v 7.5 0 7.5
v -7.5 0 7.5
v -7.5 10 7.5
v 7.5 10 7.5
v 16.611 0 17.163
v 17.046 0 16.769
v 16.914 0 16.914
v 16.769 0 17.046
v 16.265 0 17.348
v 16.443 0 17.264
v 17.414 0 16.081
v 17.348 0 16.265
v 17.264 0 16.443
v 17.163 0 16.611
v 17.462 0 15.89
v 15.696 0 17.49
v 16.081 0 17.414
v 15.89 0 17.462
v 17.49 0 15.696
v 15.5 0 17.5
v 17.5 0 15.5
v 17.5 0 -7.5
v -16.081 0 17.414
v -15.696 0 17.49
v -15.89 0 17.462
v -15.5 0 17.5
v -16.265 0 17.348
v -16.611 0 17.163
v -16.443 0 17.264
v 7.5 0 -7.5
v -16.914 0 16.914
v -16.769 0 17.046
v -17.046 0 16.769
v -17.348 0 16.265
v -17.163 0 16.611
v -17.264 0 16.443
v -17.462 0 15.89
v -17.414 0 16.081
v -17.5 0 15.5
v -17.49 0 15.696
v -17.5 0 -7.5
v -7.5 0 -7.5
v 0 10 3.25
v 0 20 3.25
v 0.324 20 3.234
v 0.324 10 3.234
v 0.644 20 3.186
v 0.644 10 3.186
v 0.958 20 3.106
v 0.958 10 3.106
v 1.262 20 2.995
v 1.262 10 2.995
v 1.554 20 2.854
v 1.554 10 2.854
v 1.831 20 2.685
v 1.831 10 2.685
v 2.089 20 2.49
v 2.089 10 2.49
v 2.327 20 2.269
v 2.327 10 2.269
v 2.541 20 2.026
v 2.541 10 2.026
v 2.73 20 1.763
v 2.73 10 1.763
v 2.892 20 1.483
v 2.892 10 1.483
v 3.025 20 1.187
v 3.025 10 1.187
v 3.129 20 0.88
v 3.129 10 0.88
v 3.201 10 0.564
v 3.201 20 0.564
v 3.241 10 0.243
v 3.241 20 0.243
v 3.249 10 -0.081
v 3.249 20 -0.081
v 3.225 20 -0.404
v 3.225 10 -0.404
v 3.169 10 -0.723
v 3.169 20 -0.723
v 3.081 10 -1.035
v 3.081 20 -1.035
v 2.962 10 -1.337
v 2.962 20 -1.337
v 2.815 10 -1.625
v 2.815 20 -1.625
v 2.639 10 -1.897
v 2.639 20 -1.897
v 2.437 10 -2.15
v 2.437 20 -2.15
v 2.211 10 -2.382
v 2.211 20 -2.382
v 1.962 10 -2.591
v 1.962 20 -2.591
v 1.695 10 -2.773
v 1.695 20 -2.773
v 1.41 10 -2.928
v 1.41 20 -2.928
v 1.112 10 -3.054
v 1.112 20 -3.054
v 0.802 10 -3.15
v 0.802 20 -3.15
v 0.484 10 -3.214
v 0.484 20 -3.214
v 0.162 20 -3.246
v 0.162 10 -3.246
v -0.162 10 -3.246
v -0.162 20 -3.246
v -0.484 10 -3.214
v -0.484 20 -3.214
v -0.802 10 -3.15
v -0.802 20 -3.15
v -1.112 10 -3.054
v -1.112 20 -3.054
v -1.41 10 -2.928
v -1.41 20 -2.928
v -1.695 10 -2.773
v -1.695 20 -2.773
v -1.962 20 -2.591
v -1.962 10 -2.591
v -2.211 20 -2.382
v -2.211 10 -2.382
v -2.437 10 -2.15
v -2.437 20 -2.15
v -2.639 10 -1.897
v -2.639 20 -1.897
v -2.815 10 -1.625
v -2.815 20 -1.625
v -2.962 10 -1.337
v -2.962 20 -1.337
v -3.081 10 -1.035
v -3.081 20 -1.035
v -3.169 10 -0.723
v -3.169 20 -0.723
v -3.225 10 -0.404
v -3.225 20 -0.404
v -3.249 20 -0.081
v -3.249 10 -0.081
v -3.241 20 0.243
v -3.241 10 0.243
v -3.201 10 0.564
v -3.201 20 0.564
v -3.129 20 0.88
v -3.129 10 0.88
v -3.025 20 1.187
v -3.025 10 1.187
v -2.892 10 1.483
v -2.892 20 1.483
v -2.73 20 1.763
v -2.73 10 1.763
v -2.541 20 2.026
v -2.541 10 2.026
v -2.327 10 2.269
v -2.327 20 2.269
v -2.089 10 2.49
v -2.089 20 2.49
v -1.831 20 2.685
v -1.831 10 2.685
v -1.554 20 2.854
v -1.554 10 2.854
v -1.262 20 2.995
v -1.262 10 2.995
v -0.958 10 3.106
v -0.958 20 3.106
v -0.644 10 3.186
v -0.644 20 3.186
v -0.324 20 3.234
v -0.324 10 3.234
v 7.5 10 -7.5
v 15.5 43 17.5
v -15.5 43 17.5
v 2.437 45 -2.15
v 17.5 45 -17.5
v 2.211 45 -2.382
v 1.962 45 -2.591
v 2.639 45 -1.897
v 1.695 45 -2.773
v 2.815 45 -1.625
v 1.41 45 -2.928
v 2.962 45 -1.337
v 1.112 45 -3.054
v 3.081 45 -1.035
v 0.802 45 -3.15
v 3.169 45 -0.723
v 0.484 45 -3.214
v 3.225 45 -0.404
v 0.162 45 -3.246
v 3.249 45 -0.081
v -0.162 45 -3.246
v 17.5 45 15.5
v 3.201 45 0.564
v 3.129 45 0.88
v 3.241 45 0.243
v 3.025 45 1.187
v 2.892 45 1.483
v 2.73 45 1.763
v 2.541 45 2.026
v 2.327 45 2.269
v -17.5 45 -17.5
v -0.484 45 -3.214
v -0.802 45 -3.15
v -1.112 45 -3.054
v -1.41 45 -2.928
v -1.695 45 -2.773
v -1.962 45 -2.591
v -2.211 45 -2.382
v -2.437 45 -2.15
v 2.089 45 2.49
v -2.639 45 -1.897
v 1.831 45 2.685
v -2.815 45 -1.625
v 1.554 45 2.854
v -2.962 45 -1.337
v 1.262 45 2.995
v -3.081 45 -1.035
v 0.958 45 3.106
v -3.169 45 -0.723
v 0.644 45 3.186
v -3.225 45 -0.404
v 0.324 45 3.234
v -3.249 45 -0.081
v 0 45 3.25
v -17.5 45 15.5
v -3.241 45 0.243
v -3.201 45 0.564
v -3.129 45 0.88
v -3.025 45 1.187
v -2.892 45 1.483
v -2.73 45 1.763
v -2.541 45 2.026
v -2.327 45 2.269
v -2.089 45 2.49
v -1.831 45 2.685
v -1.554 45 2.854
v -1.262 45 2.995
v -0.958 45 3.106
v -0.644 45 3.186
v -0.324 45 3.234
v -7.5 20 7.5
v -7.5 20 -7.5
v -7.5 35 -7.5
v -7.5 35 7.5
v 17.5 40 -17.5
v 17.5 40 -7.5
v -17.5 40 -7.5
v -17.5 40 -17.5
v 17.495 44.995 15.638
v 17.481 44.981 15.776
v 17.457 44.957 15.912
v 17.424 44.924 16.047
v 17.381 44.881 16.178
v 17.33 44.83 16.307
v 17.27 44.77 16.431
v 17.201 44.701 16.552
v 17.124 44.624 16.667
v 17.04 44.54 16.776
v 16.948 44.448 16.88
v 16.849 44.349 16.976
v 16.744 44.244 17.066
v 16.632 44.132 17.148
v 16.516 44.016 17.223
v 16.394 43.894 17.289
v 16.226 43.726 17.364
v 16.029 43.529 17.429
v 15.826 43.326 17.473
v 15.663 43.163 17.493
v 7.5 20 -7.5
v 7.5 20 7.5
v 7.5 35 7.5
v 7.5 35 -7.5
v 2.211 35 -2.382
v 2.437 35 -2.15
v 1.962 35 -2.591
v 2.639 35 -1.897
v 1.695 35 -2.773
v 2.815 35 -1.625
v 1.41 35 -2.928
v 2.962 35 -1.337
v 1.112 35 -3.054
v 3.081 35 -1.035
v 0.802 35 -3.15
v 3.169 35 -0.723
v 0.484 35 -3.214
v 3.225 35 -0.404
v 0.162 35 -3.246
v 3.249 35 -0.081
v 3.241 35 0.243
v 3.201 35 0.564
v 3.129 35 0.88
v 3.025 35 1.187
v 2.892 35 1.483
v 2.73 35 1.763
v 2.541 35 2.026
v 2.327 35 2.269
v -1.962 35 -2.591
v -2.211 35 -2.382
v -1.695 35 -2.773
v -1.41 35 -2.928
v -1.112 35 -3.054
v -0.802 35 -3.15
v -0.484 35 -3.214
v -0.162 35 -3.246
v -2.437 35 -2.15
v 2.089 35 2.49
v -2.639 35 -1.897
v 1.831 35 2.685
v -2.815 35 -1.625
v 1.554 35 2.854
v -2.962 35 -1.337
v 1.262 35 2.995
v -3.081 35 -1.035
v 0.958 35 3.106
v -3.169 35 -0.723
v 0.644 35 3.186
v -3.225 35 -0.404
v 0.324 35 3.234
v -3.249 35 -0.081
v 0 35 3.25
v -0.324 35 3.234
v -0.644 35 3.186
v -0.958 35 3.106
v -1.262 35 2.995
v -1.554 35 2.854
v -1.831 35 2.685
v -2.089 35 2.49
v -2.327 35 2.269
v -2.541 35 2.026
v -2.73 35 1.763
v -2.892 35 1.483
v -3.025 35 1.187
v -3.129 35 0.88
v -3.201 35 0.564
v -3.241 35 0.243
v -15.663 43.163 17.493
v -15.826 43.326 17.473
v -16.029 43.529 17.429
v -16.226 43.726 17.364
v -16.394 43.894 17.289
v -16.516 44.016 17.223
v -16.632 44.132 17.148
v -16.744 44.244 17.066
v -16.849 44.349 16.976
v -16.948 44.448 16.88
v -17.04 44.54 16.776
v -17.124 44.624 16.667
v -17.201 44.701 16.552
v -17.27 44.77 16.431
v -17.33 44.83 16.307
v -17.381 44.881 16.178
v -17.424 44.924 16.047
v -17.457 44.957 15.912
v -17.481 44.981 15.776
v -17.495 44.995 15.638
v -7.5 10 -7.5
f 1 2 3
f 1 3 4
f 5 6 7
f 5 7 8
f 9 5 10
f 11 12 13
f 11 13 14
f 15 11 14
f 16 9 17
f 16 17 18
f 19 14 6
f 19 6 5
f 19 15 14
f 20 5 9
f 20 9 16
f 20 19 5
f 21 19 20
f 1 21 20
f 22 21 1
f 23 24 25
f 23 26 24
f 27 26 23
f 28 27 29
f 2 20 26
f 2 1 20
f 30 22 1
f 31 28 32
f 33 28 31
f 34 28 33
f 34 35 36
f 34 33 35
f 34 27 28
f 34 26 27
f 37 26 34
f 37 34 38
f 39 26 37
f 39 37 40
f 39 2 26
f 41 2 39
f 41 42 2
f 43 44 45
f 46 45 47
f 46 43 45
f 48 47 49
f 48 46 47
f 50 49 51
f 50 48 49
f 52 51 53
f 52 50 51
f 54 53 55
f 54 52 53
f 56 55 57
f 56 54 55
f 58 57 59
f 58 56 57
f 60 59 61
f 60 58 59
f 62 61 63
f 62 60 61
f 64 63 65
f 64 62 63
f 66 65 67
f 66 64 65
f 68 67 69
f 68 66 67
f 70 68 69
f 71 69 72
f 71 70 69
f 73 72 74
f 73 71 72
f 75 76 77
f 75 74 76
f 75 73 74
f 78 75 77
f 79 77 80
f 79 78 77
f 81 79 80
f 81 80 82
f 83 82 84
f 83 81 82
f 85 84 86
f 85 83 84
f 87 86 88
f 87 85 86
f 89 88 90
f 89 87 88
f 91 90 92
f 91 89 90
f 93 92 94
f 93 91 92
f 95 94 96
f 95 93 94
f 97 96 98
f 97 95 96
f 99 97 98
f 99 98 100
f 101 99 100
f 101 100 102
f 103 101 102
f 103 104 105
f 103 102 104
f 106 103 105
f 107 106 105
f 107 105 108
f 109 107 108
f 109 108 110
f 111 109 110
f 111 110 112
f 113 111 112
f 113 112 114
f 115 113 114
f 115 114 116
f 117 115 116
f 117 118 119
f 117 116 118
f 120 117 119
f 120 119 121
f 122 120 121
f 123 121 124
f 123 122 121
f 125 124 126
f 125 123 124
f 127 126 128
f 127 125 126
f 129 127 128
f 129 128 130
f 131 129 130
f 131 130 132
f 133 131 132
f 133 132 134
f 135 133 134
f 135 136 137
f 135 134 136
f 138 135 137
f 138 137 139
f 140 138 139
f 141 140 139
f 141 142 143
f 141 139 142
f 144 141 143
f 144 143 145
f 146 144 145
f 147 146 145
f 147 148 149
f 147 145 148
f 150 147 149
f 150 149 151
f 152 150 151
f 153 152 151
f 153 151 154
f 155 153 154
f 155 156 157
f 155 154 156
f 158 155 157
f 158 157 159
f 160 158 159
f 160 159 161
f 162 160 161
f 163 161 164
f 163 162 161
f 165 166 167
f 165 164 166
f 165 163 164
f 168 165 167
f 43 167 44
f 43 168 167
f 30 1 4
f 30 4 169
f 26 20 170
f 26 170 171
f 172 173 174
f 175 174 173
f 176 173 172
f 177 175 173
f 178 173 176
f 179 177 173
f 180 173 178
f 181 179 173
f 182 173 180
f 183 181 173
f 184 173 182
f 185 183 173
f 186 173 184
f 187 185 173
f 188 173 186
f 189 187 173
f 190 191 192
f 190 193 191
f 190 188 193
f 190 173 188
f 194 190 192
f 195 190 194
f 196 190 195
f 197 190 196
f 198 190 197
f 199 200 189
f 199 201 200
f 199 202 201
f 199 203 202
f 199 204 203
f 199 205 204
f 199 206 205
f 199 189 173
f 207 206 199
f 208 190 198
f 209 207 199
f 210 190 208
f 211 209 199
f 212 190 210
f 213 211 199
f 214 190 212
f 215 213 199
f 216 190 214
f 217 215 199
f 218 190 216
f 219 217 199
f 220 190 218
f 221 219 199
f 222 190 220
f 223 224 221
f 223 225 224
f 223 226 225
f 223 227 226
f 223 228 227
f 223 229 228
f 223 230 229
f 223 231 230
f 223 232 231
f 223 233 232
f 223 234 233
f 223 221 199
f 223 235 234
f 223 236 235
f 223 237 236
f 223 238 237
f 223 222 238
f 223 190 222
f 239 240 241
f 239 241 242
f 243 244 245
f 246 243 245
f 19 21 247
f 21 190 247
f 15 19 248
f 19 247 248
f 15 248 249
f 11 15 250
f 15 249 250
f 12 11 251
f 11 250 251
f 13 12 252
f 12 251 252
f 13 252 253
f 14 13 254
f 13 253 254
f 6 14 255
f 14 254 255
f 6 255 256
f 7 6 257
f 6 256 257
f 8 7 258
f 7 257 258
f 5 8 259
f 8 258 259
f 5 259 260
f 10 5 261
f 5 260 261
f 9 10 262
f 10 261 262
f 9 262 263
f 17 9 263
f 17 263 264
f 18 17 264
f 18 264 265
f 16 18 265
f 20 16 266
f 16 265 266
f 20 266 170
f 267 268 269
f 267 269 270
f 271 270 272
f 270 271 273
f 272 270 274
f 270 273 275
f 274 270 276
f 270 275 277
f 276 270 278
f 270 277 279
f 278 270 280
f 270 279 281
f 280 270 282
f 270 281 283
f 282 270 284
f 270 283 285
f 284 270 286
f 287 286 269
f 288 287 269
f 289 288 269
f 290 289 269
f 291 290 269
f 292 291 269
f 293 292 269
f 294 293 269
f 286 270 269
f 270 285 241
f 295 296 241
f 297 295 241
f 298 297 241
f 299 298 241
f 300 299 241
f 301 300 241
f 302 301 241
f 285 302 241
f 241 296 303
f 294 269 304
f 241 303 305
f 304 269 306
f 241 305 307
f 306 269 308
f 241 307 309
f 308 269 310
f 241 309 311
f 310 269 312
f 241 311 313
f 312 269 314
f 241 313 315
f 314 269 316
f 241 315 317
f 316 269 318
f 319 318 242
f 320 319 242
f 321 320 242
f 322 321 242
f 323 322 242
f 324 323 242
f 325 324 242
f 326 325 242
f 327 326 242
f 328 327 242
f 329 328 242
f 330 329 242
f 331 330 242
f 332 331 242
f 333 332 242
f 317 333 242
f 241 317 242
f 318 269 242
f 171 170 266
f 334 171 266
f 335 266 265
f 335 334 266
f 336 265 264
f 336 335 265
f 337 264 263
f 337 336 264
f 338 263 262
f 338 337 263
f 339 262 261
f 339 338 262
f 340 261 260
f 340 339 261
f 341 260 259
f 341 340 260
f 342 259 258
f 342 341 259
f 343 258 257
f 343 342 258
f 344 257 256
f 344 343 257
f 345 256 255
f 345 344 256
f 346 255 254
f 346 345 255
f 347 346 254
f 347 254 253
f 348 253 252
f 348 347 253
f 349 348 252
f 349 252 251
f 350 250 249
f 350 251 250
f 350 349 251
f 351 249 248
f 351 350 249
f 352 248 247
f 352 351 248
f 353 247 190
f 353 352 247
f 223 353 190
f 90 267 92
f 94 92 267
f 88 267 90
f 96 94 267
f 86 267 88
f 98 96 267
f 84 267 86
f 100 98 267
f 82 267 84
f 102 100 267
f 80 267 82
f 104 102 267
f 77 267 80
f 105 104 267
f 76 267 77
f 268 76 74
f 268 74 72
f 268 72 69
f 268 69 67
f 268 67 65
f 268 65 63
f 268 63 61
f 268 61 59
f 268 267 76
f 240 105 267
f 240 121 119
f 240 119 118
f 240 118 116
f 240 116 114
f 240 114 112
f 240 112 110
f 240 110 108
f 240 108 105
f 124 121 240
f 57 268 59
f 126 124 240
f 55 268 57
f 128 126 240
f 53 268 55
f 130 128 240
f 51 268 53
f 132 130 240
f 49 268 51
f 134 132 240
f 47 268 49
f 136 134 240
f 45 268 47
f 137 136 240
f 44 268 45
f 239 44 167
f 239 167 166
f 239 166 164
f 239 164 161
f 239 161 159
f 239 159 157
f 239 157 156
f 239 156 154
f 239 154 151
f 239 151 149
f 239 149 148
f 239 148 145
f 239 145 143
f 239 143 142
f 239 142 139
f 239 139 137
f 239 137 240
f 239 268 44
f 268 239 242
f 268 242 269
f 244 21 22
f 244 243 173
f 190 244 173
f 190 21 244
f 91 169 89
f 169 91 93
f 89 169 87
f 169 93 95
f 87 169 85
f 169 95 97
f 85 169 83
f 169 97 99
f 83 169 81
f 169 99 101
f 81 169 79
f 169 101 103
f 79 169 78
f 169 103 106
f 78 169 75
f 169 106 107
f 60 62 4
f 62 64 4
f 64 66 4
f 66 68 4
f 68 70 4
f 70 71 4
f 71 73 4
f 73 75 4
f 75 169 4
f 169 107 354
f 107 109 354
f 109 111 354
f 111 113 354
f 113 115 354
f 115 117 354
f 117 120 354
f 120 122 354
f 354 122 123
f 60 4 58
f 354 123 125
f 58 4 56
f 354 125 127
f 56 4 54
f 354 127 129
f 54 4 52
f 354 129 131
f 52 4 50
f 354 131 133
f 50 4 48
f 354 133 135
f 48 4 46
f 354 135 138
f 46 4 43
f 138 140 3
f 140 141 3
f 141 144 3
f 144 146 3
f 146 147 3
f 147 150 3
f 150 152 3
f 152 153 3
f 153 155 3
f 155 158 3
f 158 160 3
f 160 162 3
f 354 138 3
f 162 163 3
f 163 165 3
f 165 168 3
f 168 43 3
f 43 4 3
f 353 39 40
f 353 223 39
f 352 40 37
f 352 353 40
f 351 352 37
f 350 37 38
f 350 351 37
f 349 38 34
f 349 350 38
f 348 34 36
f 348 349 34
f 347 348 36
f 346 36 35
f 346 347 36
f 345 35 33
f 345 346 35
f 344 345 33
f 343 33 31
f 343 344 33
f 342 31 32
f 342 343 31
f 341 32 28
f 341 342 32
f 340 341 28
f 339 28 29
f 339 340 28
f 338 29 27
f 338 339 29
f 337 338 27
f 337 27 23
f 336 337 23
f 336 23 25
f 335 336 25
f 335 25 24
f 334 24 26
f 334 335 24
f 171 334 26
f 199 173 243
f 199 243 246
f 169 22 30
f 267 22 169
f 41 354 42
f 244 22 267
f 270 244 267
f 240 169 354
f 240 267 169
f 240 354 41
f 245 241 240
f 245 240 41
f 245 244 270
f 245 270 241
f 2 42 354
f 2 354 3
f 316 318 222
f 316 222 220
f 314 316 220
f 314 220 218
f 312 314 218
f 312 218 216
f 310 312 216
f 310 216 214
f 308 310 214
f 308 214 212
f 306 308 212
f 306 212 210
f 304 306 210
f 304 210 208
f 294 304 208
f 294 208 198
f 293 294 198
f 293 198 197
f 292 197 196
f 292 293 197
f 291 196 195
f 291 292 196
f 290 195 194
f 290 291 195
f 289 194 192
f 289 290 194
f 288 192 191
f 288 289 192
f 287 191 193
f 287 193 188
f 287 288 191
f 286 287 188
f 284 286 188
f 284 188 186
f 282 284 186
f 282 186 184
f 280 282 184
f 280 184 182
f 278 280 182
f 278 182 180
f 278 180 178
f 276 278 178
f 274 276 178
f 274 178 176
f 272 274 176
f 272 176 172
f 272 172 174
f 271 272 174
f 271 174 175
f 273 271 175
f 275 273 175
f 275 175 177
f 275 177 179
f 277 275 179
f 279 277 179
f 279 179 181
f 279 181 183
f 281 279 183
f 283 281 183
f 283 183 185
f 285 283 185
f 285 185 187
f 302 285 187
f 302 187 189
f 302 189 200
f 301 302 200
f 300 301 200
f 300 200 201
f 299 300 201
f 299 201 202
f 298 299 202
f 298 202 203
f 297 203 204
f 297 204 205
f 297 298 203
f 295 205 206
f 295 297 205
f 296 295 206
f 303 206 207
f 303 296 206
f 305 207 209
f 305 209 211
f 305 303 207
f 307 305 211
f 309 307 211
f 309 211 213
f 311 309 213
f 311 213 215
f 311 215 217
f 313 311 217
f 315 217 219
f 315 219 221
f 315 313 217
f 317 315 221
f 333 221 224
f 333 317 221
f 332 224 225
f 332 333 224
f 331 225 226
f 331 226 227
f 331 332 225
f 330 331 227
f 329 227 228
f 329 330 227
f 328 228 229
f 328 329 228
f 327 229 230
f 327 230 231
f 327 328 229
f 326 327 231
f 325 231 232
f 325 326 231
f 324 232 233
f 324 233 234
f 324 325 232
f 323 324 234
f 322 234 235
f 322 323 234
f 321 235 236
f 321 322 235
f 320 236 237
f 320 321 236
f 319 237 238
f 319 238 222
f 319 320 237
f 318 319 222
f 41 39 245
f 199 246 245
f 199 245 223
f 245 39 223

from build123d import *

# Parameters (mm, degrees)
BOSS_EXTRUDE1_DEPTH = 45
SKETCH2_W           = 15
SKETCH2_H           = 10
BOSS_EXTRUDE2_DEPTH = 15
CUT_EXTRUDE1_START  = -35
SKETCH3_R           = 3.25
CUT_EXTRUDE1_DEPTH  = 35
SKETCH4_W           = 35
SKETCH4_H           = 5
BOSS_EXTRUDE3_DEPTH = 10
FILLET1_R           = 2


with BuildPart() as part:
    # Sketch1 → Boss-Extrude1 (new body)
    with BuildSketch(Plane(origin=(0, 0, 0), x_dir=(1, 0, 0), z_dir=(0, 1, 0))):
        Polygon((-17.5, 7.5), (-7.5, 7.5), (-7.5, -7.5), (7.5, -7.5), (7.5, 7.5), (17.5, 7.5), (17.5, -17.5), (-17.5, -17.5), align=None)
    extrude(amount=BOSS_EXTRUDE1_DEPTH)

    # Sketch2 → Boss-Extrude2 (add)
    with BuildSketch(Plane(origin=(0, 0, 7.5), x_dir=(-1, 0, 0), z_dir=(0, 0, -1))):
        with Locations((0, 40)):
            Rectangle(SKETCH2_W, SKETCH2_H)
        with Locations((0, 15)):
            Rectangle(SKETCH2_W, SKETCH2_H)
    extrude(amount=BOSS_EXTRUDE2_DEPTH)

    # Sketch3 → Cut-Extrude1 (cut)
    with BuildSketch(Plane(origin=(0, 45, 0), x_dir=(1, 0, 0), z_dir=(0, 1, 0)).offset(CUT_EXTRUDE1_START)):
        with Locations(Location((0, 0, 0), (0, 0, 270))):
            Circle(SKETCH3_R)
    extrude(amount=CUT_EXTRUDE1_DEPTH, mode=Mode.SUBTRACT)

    # Sketch4 → Boss-Extrude3 (add)
    with BuildSketch(Plane(origin=(0, 0, -7.5), x_dir=(-1, 0, 0), z_dir=(0, 0, -1))):
        with Locations((0, 42.5)):
            Rectangle(SKETCH4_W, SKETCH4_H)
    extrude(amount=BOSS_EXTRUDE3_DEPTH)

    # Fillet1
    fillet1_edges = [part.edges().sort_by_distance(p)[0] for p in [
        (17.5, 22.5, 17.5),
        (-17.5, 22.5, 17.5),
        (0, 45, 17.5),
    ]]
    fillet(fillet1_edges, radius=FILLET1_R)


solid = part.part
